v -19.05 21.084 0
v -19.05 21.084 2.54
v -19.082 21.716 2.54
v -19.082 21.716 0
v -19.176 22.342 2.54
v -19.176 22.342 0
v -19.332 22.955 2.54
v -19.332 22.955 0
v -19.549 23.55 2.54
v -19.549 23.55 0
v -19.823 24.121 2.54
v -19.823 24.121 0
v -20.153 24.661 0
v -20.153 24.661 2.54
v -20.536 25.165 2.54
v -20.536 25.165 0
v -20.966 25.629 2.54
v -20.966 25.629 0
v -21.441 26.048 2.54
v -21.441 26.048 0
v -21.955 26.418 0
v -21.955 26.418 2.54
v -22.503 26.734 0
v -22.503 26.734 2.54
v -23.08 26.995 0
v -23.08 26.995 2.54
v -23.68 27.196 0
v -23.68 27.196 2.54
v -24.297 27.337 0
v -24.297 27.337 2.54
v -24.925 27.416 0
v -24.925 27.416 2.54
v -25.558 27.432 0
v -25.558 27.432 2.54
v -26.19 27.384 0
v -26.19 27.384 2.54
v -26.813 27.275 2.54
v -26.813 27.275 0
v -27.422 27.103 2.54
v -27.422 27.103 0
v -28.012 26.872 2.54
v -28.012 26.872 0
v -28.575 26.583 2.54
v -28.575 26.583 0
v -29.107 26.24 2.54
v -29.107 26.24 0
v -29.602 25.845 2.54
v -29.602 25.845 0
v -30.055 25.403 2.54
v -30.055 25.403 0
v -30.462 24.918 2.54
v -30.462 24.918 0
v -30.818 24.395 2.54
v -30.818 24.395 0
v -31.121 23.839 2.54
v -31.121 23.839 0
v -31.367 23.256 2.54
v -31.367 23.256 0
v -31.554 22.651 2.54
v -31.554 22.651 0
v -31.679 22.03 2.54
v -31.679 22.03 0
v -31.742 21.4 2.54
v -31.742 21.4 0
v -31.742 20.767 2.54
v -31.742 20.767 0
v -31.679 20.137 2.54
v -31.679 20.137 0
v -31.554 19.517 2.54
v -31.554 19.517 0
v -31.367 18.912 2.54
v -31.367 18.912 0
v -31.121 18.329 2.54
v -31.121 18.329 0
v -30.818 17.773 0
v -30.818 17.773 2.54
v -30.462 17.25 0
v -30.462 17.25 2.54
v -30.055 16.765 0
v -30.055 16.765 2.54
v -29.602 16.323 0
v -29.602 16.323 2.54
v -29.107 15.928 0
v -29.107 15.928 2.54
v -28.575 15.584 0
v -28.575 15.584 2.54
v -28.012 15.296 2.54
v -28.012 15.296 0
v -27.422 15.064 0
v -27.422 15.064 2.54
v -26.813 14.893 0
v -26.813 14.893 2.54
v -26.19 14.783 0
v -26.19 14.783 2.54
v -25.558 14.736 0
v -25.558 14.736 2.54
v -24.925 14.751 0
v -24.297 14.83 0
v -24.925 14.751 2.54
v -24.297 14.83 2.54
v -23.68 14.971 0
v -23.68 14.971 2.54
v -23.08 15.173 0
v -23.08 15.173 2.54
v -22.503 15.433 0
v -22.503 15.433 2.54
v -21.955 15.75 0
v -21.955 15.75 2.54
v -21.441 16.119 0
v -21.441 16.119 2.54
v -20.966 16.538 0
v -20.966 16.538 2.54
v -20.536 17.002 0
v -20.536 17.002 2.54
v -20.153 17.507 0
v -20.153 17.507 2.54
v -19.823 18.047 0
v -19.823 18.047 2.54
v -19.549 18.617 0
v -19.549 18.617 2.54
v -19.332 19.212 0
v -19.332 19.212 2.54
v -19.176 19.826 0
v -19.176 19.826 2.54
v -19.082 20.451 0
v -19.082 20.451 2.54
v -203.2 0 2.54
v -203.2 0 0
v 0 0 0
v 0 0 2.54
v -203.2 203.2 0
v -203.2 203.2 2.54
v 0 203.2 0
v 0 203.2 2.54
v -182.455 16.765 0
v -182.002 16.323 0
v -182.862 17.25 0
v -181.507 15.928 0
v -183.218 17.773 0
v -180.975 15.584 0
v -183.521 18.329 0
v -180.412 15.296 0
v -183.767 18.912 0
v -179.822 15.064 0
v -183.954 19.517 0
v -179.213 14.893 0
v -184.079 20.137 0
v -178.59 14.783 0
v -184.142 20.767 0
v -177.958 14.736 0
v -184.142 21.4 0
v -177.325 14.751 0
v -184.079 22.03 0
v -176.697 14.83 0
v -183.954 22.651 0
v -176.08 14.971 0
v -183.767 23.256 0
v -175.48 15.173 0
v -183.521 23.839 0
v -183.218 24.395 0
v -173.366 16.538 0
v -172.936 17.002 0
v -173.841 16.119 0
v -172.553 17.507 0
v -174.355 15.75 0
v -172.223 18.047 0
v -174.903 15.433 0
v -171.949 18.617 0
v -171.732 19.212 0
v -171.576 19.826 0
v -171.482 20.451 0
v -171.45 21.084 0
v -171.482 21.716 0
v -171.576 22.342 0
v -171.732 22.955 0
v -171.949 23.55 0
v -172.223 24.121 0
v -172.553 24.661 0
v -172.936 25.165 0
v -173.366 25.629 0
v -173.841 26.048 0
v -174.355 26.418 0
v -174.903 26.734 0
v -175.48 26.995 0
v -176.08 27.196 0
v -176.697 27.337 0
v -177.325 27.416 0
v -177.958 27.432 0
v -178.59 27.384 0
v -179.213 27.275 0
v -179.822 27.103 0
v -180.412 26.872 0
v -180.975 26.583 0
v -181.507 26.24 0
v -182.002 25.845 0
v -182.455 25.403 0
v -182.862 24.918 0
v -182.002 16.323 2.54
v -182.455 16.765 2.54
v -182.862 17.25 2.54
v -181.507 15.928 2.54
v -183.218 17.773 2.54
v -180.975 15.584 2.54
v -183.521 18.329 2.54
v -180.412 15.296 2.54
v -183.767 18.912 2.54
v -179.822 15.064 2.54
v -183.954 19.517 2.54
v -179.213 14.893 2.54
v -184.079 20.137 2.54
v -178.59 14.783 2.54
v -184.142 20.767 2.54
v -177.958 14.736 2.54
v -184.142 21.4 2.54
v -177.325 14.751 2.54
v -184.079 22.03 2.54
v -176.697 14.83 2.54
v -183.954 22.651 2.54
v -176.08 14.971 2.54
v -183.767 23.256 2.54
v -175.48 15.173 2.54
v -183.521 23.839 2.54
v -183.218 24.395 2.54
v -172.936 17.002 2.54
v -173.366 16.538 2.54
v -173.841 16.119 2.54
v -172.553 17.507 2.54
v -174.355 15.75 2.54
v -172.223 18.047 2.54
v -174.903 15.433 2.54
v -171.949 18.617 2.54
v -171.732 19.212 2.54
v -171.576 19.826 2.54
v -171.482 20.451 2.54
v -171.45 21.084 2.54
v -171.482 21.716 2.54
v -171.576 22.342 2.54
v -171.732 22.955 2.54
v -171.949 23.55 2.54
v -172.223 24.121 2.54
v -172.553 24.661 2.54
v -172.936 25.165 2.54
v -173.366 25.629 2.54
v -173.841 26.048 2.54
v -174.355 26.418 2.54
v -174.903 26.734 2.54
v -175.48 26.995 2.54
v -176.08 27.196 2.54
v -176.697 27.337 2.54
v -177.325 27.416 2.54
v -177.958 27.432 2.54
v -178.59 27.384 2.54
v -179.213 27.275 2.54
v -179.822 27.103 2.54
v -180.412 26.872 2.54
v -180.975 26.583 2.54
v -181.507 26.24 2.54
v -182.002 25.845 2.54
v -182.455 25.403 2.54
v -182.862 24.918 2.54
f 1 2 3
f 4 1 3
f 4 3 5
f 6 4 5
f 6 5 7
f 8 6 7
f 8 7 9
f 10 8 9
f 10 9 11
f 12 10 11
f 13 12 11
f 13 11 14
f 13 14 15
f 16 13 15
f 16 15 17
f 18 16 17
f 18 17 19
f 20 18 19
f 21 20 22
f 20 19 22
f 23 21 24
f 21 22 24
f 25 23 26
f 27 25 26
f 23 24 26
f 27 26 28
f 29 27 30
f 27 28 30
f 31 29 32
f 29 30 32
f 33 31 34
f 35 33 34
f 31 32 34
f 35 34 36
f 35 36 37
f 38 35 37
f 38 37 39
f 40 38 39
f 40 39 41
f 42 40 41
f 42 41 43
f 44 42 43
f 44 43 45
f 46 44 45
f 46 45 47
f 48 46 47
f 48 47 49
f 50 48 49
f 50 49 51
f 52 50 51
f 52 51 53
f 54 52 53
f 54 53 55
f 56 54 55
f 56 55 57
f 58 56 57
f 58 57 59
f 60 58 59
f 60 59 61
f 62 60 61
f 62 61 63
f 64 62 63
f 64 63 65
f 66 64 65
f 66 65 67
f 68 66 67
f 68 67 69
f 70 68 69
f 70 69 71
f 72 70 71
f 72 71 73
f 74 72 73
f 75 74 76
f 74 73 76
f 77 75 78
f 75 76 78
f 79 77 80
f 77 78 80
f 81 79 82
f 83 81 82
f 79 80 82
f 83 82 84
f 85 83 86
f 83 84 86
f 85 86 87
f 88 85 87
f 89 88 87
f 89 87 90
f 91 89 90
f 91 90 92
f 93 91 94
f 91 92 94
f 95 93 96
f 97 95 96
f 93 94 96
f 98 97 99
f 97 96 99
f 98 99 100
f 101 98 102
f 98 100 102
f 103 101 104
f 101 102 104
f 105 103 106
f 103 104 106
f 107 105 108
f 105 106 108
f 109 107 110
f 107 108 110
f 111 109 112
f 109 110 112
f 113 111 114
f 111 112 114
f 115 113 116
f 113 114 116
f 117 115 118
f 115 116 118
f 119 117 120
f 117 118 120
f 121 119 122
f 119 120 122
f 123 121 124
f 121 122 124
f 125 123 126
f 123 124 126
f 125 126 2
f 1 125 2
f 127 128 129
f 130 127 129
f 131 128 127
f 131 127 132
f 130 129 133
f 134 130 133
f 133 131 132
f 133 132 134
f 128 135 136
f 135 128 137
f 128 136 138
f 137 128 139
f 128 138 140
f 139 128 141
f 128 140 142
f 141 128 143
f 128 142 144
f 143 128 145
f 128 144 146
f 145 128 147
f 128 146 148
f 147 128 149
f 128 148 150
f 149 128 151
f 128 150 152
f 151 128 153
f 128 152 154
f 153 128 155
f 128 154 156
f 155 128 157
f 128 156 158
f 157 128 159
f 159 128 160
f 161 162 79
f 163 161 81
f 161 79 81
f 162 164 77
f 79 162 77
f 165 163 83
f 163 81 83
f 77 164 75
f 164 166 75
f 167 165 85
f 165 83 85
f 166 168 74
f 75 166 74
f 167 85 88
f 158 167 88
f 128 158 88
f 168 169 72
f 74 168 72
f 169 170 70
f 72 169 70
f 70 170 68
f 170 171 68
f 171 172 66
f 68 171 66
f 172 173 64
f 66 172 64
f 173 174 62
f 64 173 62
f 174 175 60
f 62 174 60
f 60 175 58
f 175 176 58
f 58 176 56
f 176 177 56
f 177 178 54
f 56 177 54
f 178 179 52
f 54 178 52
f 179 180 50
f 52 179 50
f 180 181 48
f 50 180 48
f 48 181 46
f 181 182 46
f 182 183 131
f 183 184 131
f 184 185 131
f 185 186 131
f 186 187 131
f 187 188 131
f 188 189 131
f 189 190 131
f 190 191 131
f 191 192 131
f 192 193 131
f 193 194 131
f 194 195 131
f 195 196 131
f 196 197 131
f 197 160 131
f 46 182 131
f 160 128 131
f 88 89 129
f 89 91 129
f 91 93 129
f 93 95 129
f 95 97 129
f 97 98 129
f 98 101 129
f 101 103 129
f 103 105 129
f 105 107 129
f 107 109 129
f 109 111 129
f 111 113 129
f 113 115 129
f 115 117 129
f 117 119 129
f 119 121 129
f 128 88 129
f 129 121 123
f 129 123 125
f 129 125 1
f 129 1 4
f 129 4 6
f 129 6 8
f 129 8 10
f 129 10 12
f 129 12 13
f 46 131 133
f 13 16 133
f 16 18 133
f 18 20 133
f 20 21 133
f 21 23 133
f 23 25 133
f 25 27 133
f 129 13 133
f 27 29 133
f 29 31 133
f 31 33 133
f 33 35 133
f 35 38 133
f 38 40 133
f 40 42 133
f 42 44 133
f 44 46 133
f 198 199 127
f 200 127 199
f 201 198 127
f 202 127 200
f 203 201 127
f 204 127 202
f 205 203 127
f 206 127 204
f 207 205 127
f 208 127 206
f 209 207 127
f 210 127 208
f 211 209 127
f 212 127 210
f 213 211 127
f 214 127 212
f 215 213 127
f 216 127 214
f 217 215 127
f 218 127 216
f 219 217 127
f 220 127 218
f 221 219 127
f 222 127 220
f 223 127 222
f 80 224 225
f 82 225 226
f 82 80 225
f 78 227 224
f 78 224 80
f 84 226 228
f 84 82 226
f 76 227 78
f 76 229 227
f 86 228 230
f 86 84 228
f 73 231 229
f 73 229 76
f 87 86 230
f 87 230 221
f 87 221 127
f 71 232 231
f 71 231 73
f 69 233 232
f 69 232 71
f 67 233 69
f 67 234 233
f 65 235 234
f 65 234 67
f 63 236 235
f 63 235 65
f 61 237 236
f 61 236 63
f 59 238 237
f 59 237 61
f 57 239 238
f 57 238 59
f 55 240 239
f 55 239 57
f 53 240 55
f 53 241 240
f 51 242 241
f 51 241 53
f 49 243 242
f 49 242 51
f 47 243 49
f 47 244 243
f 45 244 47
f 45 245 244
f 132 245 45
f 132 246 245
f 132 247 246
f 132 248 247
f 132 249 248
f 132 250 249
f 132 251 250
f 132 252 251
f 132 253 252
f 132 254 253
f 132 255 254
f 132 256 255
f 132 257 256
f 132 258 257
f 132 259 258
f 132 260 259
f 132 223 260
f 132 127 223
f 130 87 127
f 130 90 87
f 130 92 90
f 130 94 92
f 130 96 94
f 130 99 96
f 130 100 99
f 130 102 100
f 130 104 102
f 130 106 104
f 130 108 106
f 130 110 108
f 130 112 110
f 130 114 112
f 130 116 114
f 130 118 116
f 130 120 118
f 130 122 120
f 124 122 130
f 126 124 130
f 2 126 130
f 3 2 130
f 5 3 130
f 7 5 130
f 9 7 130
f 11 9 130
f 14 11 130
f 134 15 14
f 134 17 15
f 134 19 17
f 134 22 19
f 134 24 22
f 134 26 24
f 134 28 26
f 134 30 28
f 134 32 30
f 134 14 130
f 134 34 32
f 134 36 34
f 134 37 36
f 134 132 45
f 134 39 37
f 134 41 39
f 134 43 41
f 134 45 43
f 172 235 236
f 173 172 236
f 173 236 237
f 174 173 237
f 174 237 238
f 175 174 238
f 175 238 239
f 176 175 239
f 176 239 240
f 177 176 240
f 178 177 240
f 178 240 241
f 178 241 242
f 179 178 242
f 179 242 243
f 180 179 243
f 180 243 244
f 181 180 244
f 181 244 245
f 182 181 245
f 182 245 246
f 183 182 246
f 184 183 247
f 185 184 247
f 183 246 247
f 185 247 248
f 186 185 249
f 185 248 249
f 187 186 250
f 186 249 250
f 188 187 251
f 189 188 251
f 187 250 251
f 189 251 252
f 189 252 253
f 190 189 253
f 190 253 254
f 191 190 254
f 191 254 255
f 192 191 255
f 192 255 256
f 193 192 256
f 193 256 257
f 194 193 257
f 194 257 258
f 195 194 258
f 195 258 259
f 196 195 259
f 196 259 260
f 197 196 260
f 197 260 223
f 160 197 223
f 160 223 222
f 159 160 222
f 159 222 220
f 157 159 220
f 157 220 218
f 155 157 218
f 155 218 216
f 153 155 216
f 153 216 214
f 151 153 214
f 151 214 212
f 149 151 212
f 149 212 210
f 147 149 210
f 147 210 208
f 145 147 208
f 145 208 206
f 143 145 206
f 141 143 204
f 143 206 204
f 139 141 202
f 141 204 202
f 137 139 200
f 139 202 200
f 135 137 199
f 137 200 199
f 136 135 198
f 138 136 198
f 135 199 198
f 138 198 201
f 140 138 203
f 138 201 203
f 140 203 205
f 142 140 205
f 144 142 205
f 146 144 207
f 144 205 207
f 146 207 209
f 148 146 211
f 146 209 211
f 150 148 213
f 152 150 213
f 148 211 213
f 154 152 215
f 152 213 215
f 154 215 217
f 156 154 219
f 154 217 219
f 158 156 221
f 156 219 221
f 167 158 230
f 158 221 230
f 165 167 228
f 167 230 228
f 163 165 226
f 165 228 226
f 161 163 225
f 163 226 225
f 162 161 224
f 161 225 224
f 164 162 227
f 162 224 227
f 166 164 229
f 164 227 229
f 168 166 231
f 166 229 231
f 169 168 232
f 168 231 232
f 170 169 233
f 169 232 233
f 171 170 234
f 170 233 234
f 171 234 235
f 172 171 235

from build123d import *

# Parameters (mm, degrees)
F0_W     = 203.2
F0_H     = 203.2
F1_DEPTH = 2.54
F3_DEPTH = 25.4
F2_R     = 6.35
F4_DEPTH = 25.4


with BuildPart() as f1:
    # F0 (on Top) → F1 (new body)
    with BuildSketch(Plane.XY):
        with Locations((-101.6, 101.6)):
            Rectangle(F0_W, F0_H)
    extrude(amount=F1_DEPTH)

    # F2 (on face) → F3 (cut)
    with BuildSketch(Plane.XY.offset(2.54)):
        with BuildLine():
            ThreePointArc((-184.15, 21.083737), (-177.8, 14.733737), (-171.45, 21.083737))
            ThreePointArc((-171.45, 21.083737), (-177.8, 27.433737), (-184.15, 21.083737))
        make_face()
    extrude(amount=-F3_DEPTH, mode=Mode.SUBTRACT)

    # F2 (on face) → F4 (cut)
    with BuildSketch(Plane.XY.offset(2.54)):
        with BuildLine():
            ThreePointArc((-184.15, 21.083737), (-177.8, 14.733737), (-171.45, 21.083737))
            ThreePointArc((-171.45, 21.083737), (-177.8, 27.433737), (-184.15, 21.083737))
        make_face()
        with Locations((-25.4, 21.083737)):
            Circle(F2_R)
    extrude(amount=-F4_DEPTH, mode=Mode.SUBTRACT)


solid = f1.part
